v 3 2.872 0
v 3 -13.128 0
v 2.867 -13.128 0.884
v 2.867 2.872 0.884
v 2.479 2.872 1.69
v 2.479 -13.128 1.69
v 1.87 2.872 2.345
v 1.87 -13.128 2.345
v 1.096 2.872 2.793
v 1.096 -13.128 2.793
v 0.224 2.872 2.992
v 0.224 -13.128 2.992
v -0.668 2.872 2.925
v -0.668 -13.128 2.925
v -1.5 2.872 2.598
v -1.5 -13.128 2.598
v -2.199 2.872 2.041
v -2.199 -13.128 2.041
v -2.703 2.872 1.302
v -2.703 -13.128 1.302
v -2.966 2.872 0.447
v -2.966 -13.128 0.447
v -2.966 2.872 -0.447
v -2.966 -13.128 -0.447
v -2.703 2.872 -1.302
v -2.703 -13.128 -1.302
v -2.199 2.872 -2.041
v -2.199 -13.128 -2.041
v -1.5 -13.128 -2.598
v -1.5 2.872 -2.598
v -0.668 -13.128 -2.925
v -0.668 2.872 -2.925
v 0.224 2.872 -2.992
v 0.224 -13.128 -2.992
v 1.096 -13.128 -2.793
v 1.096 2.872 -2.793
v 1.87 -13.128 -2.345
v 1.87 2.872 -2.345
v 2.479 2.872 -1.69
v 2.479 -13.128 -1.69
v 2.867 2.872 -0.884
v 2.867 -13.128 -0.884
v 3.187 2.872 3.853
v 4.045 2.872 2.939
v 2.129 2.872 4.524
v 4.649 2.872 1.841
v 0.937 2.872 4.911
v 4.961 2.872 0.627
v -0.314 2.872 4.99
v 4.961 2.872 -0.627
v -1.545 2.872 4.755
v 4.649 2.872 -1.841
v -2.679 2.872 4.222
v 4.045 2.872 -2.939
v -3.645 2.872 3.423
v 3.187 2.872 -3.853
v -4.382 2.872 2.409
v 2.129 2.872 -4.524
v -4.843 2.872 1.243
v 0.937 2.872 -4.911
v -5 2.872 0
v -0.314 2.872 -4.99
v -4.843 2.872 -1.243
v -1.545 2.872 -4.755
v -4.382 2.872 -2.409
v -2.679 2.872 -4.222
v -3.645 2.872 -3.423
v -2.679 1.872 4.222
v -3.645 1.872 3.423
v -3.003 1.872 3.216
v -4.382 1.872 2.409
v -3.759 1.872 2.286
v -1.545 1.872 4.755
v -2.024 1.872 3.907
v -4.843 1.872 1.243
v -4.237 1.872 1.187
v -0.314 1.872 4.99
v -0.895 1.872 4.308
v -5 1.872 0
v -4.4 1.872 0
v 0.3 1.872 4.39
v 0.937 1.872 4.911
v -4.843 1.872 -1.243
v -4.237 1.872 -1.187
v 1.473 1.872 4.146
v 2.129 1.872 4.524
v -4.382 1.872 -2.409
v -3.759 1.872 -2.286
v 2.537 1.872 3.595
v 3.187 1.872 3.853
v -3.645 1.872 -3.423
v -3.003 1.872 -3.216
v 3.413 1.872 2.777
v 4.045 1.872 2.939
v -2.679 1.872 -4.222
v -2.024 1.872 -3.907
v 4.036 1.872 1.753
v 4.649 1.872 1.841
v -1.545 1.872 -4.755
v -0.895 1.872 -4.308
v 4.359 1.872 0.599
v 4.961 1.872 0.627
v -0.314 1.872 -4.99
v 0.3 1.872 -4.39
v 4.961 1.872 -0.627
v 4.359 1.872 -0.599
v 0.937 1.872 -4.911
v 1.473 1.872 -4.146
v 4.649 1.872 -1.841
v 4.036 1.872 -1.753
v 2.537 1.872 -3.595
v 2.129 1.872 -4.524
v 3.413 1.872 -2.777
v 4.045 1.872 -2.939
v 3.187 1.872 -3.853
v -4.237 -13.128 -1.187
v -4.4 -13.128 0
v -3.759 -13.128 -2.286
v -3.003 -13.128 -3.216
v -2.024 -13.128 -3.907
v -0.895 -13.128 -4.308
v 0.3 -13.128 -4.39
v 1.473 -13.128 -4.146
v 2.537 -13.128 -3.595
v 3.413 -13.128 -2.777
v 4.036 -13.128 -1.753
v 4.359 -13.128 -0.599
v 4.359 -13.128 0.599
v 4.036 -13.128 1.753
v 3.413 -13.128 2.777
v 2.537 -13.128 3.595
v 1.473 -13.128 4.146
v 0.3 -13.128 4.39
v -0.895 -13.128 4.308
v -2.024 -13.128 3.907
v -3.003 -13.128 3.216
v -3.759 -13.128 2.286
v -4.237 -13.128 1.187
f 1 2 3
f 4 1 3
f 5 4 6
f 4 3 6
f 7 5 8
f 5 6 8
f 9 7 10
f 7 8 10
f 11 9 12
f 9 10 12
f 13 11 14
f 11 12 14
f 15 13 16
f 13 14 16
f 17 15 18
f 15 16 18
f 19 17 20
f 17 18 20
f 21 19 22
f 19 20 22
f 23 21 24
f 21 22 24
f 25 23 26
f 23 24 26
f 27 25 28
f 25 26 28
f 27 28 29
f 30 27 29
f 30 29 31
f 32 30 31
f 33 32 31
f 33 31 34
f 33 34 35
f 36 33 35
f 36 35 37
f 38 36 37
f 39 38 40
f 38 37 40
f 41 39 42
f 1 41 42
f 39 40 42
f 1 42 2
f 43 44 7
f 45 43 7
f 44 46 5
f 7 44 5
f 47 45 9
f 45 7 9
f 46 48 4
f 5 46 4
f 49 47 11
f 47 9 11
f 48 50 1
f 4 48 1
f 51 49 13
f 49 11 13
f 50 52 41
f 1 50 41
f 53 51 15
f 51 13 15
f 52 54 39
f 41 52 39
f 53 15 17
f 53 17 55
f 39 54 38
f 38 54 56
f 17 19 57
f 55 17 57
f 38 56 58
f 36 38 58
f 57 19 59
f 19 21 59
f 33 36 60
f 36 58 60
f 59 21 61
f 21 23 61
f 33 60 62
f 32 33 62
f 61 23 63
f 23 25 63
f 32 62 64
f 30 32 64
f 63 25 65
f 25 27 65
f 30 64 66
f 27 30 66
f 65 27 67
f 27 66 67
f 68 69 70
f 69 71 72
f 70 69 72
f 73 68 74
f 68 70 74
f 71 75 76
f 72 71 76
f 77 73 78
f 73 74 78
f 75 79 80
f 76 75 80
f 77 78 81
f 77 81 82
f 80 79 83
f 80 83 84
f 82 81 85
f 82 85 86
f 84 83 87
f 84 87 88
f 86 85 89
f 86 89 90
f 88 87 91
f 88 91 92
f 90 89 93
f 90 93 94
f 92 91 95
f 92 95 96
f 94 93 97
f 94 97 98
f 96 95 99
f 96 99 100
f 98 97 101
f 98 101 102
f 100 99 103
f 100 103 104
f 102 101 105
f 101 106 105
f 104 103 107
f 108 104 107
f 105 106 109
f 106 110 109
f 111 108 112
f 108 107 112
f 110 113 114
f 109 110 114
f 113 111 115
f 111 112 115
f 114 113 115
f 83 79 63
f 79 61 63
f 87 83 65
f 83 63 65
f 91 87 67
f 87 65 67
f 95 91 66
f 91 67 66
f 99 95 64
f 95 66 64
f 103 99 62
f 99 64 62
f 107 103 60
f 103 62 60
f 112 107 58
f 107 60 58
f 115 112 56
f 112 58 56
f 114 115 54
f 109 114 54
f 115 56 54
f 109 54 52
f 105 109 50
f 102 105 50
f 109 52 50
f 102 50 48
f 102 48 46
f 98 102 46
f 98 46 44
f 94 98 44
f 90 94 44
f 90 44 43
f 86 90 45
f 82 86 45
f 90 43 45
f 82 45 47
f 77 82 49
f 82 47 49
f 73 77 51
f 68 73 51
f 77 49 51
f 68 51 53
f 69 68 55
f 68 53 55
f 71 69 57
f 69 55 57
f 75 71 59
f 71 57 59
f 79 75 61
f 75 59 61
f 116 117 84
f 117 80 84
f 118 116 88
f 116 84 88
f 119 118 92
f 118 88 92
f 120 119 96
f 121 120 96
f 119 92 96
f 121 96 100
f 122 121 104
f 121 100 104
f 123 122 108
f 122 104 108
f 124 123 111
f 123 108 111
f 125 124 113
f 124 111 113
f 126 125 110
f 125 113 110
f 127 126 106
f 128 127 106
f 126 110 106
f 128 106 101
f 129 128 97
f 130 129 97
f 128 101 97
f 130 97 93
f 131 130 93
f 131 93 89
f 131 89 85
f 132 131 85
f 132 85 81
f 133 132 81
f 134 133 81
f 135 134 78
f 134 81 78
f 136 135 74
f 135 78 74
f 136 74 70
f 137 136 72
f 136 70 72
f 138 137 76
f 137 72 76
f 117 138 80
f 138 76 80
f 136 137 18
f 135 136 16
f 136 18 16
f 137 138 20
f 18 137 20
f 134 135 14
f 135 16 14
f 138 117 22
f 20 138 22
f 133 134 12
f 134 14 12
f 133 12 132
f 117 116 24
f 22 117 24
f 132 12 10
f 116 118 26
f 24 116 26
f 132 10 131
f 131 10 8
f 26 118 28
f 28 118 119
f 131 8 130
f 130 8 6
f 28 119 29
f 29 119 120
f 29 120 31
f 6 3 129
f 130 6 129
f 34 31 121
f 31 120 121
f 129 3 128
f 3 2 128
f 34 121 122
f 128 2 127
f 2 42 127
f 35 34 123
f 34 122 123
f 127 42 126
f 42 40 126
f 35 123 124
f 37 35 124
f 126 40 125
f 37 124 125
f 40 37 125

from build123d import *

# Parameters (mm, degrees)
SKETCH4_R           = 3
BOSS_EXTRUDE1_DEPTH = 16
SKETCH5_R           = 3
CUT_EXTRUDE1_DEPTH  = 16


with BuildPart() as part:
    # Sketch2 → Revolve3 (revolve)
    with BuildSketch(Plane.XY):
        Polygon((-5, 2.872057786), (0, 2.872057786), (0, -13.127942214), (-4.4, -13.127942214), (-4.4, 1.872057786), (-5, 1.872057786), align=None)
    revolve(axis=Axis((0, 2.872057786, 0), (0, -1, 0)))

    # Sketch4 → Boss-Extrude1 (add)
    with BuildSketch(Plane.XZ.offset(13.127942214)):
        Circle(SKETCH4_R)
    extrude(amount=-BOSS_EXTRUDE1_DEPTH)

    # Sketch5 → Cut-Extrude1 (cut)
    with BuildSketch(Plane.XZ.offset(13.127942214)):
        Circle(SKETCH5_R)
    extrude(amount=-CUT_EXTRUDE1_DEPTH, mode=Mode.SUBTRACT)


solid = part.part
